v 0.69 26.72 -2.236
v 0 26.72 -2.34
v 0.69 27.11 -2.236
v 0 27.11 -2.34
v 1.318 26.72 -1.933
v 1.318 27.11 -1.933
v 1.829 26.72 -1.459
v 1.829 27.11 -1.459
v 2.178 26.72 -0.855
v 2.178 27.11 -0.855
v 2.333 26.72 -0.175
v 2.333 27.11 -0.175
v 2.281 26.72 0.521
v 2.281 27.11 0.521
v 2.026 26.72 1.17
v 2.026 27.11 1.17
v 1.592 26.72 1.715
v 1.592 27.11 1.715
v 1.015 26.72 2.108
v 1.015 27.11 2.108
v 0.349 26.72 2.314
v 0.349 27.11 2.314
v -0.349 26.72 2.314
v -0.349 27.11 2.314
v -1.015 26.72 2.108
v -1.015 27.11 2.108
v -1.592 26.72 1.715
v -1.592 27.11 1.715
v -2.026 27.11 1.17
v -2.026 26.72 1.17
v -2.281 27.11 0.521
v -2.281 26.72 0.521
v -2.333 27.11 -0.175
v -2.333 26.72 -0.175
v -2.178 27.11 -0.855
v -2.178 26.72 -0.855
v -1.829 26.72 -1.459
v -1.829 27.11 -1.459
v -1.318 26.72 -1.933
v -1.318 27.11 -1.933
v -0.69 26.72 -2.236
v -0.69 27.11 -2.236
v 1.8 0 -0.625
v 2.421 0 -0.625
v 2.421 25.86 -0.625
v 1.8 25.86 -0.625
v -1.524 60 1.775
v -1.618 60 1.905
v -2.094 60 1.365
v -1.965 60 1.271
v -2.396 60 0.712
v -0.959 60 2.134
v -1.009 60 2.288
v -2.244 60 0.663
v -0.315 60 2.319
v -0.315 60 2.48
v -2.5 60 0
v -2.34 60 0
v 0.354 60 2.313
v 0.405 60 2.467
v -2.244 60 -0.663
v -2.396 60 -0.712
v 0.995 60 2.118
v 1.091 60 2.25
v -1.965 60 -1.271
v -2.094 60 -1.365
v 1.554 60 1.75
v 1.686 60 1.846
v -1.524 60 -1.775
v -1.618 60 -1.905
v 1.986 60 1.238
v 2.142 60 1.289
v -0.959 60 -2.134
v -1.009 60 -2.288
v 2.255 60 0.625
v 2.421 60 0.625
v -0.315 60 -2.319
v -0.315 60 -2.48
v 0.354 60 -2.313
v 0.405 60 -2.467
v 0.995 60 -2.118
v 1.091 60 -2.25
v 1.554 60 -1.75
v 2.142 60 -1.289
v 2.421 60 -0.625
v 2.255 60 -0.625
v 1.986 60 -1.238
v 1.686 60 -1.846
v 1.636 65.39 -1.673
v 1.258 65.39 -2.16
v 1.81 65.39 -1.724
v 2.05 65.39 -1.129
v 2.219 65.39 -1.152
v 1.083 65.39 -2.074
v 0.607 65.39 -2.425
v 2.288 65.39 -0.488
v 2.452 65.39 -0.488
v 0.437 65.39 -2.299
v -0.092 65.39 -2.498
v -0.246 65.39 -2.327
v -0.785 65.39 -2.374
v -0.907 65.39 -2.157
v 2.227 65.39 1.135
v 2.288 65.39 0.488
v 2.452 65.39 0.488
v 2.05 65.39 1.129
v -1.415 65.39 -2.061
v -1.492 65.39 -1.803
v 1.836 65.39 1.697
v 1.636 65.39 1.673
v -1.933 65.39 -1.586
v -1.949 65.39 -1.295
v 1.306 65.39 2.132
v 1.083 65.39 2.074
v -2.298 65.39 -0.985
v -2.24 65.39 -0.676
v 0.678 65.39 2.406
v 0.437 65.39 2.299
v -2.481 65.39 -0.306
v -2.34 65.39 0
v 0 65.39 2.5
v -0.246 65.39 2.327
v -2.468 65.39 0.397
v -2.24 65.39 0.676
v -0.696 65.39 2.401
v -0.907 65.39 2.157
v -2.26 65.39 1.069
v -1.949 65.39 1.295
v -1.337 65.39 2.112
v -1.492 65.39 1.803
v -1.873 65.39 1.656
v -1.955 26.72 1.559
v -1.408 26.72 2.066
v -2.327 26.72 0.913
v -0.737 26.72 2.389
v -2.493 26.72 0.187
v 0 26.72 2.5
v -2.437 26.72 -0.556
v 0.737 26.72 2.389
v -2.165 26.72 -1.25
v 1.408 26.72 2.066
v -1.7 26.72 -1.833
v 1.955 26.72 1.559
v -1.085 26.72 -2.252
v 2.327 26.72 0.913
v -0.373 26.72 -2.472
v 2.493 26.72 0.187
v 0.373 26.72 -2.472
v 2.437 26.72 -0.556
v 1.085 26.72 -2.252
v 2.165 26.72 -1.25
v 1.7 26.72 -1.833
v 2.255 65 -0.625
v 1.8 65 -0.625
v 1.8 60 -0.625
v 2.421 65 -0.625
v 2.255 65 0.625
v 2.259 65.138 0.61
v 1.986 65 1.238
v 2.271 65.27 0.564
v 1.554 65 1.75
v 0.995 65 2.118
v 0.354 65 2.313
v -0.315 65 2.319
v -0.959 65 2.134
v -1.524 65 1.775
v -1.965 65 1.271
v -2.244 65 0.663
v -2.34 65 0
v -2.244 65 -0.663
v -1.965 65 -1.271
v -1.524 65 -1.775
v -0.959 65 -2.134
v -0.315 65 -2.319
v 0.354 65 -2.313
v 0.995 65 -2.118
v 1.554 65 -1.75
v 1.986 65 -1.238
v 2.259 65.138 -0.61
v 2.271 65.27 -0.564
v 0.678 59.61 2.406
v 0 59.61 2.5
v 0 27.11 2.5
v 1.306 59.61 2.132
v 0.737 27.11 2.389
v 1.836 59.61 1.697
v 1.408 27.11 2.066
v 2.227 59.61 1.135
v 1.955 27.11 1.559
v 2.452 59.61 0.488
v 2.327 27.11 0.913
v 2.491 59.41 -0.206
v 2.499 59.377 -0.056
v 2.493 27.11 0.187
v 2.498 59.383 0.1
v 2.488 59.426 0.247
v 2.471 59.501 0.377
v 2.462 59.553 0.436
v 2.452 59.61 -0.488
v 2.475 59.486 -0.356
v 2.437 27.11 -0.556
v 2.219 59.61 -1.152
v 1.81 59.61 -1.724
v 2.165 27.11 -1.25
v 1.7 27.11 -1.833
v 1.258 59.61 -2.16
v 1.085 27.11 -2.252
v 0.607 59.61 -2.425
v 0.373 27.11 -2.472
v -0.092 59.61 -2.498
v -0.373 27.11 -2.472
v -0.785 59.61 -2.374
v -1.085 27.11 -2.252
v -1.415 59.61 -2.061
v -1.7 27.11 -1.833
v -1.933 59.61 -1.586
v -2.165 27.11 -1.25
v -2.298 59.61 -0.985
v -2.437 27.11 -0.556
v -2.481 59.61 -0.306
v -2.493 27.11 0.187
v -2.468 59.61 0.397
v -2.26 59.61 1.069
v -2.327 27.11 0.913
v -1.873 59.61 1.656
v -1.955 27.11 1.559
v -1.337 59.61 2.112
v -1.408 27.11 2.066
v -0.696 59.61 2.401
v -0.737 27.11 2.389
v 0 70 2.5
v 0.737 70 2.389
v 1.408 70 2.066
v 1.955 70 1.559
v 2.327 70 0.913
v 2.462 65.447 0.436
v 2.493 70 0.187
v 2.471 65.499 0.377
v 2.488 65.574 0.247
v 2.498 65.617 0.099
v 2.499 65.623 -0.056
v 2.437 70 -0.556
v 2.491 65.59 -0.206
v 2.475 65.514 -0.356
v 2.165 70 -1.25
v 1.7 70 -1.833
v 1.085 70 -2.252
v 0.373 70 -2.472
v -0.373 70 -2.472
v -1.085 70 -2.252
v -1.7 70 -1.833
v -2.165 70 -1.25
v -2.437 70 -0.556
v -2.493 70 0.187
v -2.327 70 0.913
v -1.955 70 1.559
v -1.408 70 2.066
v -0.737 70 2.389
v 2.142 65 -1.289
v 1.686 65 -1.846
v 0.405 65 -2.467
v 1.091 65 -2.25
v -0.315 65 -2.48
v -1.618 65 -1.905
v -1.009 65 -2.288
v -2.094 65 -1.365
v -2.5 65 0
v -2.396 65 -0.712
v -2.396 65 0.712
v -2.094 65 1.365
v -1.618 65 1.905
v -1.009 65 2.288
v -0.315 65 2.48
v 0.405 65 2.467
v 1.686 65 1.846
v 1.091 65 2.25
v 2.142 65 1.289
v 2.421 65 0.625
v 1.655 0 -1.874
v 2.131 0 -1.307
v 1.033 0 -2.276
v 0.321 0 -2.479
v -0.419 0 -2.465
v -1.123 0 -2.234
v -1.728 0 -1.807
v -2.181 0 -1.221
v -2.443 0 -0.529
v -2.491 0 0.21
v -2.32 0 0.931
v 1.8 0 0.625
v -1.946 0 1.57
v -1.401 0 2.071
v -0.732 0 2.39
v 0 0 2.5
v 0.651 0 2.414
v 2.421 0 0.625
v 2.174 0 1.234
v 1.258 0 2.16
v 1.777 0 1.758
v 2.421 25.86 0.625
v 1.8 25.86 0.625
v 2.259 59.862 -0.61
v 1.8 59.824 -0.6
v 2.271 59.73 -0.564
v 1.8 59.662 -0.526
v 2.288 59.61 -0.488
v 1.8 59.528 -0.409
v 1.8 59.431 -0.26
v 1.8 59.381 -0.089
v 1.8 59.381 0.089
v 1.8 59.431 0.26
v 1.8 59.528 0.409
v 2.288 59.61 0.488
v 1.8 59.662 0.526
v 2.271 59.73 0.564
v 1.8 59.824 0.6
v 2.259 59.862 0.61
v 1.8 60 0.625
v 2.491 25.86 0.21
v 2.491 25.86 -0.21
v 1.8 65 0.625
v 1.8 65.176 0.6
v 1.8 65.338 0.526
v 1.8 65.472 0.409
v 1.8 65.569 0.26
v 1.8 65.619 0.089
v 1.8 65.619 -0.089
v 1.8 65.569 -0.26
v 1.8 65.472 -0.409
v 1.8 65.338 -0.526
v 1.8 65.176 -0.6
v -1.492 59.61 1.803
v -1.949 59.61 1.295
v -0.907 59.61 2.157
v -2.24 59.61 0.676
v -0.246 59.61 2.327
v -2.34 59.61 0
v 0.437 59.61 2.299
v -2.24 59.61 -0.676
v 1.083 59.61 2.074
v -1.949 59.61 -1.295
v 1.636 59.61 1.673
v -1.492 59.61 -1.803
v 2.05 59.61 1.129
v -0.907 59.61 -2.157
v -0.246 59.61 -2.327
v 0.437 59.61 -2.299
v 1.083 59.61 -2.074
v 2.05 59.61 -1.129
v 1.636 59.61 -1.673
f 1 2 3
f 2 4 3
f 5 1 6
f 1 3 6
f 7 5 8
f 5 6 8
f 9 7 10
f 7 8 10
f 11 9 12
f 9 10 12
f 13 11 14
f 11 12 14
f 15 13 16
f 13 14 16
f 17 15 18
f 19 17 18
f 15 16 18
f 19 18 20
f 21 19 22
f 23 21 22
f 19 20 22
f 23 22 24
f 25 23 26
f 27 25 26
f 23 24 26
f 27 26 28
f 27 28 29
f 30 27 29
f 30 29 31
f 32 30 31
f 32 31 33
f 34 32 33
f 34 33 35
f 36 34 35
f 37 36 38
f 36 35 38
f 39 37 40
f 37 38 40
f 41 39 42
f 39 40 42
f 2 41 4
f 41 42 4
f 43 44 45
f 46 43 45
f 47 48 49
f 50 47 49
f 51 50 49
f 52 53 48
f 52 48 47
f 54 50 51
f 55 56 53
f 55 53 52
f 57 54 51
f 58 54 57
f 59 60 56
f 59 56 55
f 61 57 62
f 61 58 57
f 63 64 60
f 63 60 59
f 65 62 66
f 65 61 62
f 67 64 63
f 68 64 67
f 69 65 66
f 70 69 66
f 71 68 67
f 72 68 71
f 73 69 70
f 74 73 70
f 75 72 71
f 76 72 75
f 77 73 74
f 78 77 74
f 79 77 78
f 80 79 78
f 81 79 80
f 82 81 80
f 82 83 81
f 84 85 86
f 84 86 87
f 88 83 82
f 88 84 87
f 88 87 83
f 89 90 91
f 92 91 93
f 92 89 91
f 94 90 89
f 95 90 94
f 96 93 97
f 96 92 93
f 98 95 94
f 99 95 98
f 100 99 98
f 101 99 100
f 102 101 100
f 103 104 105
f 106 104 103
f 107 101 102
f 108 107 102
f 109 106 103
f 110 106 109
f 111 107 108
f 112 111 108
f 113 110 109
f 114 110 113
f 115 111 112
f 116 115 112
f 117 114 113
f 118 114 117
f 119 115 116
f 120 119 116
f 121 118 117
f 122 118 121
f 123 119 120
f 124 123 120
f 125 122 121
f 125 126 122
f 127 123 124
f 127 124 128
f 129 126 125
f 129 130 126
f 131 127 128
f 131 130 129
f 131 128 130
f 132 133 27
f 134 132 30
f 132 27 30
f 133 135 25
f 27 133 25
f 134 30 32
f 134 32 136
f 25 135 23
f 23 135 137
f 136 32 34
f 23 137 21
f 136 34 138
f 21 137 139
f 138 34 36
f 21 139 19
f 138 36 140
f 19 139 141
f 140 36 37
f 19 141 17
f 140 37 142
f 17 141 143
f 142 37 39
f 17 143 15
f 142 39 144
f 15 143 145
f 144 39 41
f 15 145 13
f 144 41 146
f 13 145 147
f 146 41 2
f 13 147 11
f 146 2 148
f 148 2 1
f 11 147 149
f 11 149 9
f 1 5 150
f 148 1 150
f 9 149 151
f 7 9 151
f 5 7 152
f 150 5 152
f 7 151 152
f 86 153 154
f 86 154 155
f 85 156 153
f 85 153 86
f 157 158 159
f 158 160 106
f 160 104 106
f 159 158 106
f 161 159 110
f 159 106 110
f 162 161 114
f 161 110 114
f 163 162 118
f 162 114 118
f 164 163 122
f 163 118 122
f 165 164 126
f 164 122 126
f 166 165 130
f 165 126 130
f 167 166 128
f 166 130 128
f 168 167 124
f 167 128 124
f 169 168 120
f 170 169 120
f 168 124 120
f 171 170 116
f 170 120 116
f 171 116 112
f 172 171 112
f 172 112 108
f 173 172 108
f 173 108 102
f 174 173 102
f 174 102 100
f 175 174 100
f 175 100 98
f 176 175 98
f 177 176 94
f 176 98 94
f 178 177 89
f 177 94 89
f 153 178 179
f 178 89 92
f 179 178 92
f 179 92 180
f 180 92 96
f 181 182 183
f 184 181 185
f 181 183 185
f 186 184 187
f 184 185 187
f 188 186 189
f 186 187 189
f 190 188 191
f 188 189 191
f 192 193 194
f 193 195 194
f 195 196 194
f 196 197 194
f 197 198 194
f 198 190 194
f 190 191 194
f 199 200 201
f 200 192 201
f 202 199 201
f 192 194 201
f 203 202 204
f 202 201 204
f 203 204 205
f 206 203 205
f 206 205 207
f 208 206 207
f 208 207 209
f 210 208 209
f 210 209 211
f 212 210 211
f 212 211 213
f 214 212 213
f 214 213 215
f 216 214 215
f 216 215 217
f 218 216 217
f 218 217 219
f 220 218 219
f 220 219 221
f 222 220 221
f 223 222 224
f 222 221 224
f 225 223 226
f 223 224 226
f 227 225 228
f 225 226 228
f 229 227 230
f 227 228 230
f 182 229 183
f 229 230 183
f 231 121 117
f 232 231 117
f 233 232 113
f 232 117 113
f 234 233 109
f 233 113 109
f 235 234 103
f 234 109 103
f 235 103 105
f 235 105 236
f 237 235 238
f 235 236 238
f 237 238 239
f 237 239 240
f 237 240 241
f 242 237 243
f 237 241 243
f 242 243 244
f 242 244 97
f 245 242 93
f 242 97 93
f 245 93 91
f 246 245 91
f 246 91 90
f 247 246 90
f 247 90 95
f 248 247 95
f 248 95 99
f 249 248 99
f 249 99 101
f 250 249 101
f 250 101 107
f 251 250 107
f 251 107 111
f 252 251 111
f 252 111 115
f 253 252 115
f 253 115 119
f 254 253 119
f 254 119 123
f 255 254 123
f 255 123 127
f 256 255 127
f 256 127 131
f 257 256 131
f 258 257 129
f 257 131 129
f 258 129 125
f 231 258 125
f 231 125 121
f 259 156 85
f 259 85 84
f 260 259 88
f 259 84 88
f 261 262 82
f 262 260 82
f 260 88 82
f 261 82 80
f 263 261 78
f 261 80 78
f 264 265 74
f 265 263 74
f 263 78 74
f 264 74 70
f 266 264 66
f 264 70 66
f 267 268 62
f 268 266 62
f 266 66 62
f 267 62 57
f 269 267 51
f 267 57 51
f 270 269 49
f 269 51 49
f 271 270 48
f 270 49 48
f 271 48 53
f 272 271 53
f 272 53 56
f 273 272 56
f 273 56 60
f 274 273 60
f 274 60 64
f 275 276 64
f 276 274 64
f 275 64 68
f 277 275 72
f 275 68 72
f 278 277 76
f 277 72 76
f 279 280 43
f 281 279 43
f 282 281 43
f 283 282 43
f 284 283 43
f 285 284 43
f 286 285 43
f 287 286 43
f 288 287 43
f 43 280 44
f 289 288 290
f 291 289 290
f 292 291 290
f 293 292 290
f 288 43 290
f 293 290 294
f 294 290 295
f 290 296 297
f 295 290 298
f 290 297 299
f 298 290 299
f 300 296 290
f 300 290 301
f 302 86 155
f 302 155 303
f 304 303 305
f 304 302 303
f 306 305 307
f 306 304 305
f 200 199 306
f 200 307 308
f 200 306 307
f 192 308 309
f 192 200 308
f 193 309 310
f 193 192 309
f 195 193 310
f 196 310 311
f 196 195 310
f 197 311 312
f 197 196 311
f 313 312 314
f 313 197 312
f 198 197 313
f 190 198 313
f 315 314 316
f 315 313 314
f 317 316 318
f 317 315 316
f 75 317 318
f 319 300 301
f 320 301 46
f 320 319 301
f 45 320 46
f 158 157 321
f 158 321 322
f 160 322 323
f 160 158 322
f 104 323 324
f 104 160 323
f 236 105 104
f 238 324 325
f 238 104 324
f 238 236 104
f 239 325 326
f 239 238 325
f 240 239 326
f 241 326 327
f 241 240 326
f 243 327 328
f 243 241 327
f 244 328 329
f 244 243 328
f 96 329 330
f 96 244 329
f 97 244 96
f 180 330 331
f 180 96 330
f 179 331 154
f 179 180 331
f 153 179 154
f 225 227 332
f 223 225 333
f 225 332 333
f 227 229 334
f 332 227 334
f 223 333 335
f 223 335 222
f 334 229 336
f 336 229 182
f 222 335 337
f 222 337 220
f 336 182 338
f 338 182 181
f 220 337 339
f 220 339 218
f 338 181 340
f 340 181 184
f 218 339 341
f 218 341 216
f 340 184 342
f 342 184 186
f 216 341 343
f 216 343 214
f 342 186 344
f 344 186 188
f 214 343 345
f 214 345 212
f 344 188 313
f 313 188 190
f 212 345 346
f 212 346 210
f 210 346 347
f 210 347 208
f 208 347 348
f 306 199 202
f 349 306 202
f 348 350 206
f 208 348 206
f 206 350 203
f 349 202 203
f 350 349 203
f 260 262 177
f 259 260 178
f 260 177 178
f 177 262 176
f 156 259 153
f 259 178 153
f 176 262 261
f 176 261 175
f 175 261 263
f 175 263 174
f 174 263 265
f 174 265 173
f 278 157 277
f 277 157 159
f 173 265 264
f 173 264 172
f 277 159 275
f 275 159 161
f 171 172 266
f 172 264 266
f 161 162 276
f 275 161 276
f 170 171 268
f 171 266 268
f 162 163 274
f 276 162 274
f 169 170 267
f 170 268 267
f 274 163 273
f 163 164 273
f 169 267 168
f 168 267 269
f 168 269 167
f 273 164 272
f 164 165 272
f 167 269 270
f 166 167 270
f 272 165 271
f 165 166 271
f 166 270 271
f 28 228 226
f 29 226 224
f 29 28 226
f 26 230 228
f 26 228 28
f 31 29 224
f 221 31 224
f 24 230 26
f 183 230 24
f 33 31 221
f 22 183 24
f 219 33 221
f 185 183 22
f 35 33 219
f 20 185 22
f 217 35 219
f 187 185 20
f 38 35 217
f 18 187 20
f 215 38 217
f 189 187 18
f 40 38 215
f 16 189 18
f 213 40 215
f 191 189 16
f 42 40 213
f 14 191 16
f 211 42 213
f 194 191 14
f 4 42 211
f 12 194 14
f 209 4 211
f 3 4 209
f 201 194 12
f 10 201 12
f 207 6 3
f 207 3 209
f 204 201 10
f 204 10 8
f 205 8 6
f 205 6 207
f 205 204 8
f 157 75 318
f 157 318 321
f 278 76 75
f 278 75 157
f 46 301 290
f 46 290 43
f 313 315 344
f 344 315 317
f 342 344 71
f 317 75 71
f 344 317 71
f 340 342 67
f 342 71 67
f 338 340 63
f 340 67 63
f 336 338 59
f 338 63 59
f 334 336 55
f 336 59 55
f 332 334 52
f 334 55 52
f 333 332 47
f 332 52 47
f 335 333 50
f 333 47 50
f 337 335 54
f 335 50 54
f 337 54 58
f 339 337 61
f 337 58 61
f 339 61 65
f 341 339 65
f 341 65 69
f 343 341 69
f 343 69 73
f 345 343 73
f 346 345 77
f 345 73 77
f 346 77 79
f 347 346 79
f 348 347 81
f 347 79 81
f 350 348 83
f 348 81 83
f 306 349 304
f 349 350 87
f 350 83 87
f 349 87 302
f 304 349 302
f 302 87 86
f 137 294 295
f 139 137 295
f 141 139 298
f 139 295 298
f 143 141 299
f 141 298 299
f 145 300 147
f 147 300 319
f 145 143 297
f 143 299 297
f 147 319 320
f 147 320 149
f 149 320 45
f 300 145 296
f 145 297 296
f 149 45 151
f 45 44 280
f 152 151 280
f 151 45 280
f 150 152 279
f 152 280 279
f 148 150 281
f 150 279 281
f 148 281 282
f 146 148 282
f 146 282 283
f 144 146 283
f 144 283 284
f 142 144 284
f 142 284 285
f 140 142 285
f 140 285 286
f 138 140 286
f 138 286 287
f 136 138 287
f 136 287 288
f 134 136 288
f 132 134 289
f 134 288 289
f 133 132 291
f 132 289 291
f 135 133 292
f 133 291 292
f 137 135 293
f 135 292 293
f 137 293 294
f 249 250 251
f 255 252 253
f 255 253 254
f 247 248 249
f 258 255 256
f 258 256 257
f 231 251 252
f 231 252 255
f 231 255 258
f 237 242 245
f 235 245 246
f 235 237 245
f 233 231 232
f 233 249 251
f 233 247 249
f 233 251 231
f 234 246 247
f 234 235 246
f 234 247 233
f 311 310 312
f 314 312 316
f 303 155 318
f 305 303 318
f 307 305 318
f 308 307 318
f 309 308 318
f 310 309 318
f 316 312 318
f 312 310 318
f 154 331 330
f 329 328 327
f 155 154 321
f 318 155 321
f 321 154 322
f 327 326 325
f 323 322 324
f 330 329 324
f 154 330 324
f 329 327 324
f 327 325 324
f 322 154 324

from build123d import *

# Parameters (mm, degrees)
SKETCH1_R           = 2.5
BOSS_EXTRUDE1_DEPTH = 70
SKETCH2_W           = 8.002740347
SKETCH2_H           = 0.39
SKETCH3_W           = 11.814730857
SKETCH3_H           = 0.39
SKETCH4_W           = 12.637510598
SKETCH4_H           = 0.39
CUT_EXTRUDE1_DEPTH  = 0.7
SKETCH6_W           = 1.25
SKETCH6_H           = 31.626867322
CUT_EXTRUDE2_DEPTH  = 0.7


with BuildPart() as part:
    # Sketch1 → Boss-Extrude1 (new body)
    with BuildSketch(Plane(origin=(0, 0, 0), x_dir=(1, 0, 0), z_dir=(0, 1, 0))):
        with Locations(Location((0, 0, 0), (0, 0, 270))):
            Circle(SKETCH1_R)
    extrude(amount=BOSS_EXTRUDE1_DEPTH)

    # Sketch2 → Cut-Revolve1 (revolve, cut)
    with BuildSketch(Plane(origin=(0, 0, 0), x_dir=(0, 0, -1), z_dir=(1, 0, 0))):
        with Locations((-6.341370174, 65.195)):
            Rectangle(SKETCH2_W, SKETCH2_H)
    revolve(axis=Axis((0, 67.145702963, 0), (0, -1, 0)), mode=Mode.SUBTRACT)

    # Sketch3 → Cut-Revolve2 (revolve, cut)
    with BuildSketch(Plane(origin=(0, 0, 0), x_dir=(0, 0, -1), z_dir=(1, 0, 0)), mode=Mode.PRIVATE) as cut_revolve2_sk:
        with Locations((-8.247365429, 59.805)):
            Rectangle(SKETCH3_W, SKETCH3_H)
    revolve(cut_revolve2_sk.sketch.rotate(Axis((0, 61.014608436, 0), (0, -1, 0)), 180), axis=Axis((0, 61.014608436, 0), (0, -1, 0)), mode=Mode.SUBTRACT)

    # Sketch4 → Cut-Revolve3 (revolve, cut)
    with BuildSketch(Plane(origin=(0, 0, 0), x_dir=(0, 0, -1), z_dir=(1, 0, 0)), mode=Mode.PRIVATE) as cut_revolve3_sk:
        with Locations((-8.658755299, 26.915)):
            Rectangle(SKETCH4_W, SKETCH4_H)
    revolve(cut_revolve3_sk.sketch.rotate(Axis((0, 27.341534507, 0), (0, -1, 0)), 180), axis=Axis((0, 27.341534507, 0), (0, -1, 0)), mode=Mode.SUBTRACT)

    # Sketch5 → Cut-Extrude1 (cut)
    with BuildSketch(Plane(origin=(2.5, 0, 0), x_dir=(0, 0, -1), z_dir=(1, 0, 0))):
        with BuildLine():
            Line((0.625, 65), (0.625, 60))
            ThreePointArc((0.625, 60), (0, 59.375), (-0.625, 60))
            Line((-0.625, 60), (-0.625, 65))
            ThreePointArc((-0.625, 65), (0, 65.625), (0.625, 65))
        make_face()
    extrude(amount=-CUT_EXTRUDE1_DEPTH, mode=Mode.SUBTRACT)

    # Sketch6 → Cut-Extrude2 (cut)
    with BuildSketch(Plane(origin=(2.5, 0, 0), x_dir=(0, 0, -1), z_dir=(1, 0, 0))):
        with Locations((0, 10.046566339)):
            Rectangle(SKETCH6_W, SKETCH6_H)
    extrude(amount=-CUT_EXTRUDE2_DEPTH, mode=Mode.SUBTRACT)


solid = part.part
